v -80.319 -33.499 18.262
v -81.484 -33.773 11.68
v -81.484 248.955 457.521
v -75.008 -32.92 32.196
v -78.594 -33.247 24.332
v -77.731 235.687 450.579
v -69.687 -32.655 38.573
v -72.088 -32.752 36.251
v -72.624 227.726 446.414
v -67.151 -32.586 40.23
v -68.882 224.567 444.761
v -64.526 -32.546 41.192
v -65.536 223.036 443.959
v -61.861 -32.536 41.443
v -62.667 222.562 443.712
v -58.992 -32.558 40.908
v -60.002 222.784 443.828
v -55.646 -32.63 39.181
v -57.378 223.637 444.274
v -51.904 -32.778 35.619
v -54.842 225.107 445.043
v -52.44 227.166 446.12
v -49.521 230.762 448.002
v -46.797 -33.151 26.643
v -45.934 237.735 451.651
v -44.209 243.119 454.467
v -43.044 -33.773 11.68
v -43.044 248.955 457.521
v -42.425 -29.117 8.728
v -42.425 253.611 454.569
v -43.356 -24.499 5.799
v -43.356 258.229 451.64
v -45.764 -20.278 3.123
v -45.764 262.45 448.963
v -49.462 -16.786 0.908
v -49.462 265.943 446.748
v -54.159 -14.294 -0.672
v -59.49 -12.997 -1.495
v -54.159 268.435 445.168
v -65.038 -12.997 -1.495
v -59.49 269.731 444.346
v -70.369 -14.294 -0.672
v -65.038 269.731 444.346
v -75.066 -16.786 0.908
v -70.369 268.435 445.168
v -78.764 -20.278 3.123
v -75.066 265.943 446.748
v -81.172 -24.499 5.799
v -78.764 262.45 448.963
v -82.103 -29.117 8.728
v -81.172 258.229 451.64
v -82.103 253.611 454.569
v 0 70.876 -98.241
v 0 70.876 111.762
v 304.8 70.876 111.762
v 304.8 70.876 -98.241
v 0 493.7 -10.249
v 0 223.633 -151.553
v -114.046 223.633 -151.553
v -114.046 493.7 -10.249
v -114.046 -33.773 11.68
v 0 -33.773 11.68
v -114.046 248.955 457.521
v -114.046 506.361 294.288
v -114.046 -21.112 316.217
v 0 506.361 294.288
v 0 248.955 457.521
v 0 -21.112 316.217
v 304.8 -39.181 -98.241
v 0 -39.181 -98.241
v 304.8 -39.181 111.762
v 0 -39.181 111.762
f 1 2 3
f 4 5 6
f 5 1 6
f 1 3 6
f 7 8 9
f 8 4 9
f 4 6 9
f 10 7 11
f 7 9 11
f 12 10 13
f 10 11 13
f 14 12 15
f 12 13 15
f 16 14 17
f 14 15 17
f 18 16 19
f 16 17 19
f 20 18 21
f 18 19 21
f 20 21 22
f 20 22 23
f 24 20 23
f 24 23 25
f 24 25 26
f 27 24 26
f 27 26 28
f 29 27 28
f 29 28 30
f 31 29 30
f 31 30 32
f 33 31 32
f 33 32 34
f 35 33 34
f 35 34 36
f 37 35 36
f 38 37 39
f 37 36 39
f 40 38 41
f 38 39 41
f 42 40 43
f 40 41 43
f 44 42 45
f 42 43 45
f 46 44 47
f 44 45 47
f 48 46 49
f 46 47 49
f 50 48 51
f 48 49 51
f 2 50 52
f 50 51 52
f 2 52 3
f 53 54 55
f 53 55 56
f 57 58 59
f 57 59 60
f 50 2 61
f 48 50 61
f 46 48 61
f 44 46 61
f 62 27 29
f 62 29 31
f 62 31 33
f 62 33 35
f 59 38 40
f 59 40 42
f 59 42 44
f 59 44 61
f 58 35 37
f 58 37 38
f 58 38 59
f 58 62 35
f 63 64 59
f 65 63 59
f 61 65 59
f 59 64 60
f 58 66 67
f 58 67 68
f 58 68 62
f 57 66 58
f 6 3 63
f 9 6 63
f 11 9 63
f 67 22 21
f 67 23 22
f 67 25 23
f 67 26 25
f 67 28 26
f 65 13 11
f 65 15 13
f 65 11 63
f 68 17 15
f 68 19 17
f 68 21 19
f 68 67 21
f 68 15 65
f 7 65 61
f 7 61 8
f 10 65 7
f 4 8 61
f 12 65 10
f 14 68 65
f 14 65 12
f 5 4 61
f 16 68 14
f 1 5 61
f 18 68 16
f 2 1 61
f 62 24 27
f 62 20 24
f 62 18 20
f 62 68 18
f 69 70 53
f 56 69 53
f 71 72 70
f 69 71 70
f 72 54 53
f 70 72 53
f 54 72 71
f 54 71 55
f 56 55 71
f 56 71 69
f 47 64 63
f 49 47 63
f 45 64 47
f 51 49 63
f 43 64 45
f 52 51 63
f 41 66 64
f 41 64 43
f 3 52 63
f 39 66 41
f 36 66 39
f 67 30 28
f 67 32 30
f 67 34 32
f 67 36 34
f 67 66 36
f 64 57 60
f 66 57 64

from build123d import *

# Parameters (mm, degrees)
SKETCH1_W           = 210.00243261
SKETCH1_H           = 110.05666017
BOSS_EXTRUDE1_DEPTH = 304.8
BOSS_EXTRUDE2_DEPTH = 114.046
SKETCH3_R           = 19.847146284
CUT_EXTRUDE1_DEPTH  = 737.439597843


with BuildPart() as part:
    # Sketch1 → Boss-Extrude1 (new body)
    with BuildSketch(Plane(origin=(0, 0, 0), x_dir=(0, 0, -1), z_dir=(1, 0, 0))):
        with Locations((-6.76044486, 15.847323966)):
            Rectangle(SKETCH1_W, SKETCH1_H)
    extrude(amount=BOSS_EXTRUDE1_DEPTH)


with BuildPart() as body_2:
    # Sketch2 → Boss-Extrude2 (new body)
    with BuildSketch(Plane(origin=(0, 0, 0), x_dir=(0, 0, -1), z_dir=(1, 0, 0))):
        Polygon((10.24911483, 493.70040749), (-294.287810867, 506.361406154), (-457.521020196, 248.955191443), (-316.217303829, -21.112021933), (-11.680378132, -33.773020598), (151.552831197, 223.633194114), align=None)
    extrude(amount=-BOSS_EXTRUDE2_DEPTH)

    # Sketch3 → Cut-Extrude1 (cut, through all)
    with BuildSketch(Plane(origin=(0, 278.324614741, 438.896507861), x_dir=(1, 0, 0), z_dir=(0, 0.5355420253583275, 0.8445085784496807))):
        with Locations(Location((-62.264120874, -29.827827888, 0), (0, 0, 194.439723092))):
            Circle(SKETCH3_R)
    extrude(amount=-CUT_EXTRUDE1_DEPTH, mode=Mode.SUBTRACT)


solid = Compound([part.part, body_2.part])
